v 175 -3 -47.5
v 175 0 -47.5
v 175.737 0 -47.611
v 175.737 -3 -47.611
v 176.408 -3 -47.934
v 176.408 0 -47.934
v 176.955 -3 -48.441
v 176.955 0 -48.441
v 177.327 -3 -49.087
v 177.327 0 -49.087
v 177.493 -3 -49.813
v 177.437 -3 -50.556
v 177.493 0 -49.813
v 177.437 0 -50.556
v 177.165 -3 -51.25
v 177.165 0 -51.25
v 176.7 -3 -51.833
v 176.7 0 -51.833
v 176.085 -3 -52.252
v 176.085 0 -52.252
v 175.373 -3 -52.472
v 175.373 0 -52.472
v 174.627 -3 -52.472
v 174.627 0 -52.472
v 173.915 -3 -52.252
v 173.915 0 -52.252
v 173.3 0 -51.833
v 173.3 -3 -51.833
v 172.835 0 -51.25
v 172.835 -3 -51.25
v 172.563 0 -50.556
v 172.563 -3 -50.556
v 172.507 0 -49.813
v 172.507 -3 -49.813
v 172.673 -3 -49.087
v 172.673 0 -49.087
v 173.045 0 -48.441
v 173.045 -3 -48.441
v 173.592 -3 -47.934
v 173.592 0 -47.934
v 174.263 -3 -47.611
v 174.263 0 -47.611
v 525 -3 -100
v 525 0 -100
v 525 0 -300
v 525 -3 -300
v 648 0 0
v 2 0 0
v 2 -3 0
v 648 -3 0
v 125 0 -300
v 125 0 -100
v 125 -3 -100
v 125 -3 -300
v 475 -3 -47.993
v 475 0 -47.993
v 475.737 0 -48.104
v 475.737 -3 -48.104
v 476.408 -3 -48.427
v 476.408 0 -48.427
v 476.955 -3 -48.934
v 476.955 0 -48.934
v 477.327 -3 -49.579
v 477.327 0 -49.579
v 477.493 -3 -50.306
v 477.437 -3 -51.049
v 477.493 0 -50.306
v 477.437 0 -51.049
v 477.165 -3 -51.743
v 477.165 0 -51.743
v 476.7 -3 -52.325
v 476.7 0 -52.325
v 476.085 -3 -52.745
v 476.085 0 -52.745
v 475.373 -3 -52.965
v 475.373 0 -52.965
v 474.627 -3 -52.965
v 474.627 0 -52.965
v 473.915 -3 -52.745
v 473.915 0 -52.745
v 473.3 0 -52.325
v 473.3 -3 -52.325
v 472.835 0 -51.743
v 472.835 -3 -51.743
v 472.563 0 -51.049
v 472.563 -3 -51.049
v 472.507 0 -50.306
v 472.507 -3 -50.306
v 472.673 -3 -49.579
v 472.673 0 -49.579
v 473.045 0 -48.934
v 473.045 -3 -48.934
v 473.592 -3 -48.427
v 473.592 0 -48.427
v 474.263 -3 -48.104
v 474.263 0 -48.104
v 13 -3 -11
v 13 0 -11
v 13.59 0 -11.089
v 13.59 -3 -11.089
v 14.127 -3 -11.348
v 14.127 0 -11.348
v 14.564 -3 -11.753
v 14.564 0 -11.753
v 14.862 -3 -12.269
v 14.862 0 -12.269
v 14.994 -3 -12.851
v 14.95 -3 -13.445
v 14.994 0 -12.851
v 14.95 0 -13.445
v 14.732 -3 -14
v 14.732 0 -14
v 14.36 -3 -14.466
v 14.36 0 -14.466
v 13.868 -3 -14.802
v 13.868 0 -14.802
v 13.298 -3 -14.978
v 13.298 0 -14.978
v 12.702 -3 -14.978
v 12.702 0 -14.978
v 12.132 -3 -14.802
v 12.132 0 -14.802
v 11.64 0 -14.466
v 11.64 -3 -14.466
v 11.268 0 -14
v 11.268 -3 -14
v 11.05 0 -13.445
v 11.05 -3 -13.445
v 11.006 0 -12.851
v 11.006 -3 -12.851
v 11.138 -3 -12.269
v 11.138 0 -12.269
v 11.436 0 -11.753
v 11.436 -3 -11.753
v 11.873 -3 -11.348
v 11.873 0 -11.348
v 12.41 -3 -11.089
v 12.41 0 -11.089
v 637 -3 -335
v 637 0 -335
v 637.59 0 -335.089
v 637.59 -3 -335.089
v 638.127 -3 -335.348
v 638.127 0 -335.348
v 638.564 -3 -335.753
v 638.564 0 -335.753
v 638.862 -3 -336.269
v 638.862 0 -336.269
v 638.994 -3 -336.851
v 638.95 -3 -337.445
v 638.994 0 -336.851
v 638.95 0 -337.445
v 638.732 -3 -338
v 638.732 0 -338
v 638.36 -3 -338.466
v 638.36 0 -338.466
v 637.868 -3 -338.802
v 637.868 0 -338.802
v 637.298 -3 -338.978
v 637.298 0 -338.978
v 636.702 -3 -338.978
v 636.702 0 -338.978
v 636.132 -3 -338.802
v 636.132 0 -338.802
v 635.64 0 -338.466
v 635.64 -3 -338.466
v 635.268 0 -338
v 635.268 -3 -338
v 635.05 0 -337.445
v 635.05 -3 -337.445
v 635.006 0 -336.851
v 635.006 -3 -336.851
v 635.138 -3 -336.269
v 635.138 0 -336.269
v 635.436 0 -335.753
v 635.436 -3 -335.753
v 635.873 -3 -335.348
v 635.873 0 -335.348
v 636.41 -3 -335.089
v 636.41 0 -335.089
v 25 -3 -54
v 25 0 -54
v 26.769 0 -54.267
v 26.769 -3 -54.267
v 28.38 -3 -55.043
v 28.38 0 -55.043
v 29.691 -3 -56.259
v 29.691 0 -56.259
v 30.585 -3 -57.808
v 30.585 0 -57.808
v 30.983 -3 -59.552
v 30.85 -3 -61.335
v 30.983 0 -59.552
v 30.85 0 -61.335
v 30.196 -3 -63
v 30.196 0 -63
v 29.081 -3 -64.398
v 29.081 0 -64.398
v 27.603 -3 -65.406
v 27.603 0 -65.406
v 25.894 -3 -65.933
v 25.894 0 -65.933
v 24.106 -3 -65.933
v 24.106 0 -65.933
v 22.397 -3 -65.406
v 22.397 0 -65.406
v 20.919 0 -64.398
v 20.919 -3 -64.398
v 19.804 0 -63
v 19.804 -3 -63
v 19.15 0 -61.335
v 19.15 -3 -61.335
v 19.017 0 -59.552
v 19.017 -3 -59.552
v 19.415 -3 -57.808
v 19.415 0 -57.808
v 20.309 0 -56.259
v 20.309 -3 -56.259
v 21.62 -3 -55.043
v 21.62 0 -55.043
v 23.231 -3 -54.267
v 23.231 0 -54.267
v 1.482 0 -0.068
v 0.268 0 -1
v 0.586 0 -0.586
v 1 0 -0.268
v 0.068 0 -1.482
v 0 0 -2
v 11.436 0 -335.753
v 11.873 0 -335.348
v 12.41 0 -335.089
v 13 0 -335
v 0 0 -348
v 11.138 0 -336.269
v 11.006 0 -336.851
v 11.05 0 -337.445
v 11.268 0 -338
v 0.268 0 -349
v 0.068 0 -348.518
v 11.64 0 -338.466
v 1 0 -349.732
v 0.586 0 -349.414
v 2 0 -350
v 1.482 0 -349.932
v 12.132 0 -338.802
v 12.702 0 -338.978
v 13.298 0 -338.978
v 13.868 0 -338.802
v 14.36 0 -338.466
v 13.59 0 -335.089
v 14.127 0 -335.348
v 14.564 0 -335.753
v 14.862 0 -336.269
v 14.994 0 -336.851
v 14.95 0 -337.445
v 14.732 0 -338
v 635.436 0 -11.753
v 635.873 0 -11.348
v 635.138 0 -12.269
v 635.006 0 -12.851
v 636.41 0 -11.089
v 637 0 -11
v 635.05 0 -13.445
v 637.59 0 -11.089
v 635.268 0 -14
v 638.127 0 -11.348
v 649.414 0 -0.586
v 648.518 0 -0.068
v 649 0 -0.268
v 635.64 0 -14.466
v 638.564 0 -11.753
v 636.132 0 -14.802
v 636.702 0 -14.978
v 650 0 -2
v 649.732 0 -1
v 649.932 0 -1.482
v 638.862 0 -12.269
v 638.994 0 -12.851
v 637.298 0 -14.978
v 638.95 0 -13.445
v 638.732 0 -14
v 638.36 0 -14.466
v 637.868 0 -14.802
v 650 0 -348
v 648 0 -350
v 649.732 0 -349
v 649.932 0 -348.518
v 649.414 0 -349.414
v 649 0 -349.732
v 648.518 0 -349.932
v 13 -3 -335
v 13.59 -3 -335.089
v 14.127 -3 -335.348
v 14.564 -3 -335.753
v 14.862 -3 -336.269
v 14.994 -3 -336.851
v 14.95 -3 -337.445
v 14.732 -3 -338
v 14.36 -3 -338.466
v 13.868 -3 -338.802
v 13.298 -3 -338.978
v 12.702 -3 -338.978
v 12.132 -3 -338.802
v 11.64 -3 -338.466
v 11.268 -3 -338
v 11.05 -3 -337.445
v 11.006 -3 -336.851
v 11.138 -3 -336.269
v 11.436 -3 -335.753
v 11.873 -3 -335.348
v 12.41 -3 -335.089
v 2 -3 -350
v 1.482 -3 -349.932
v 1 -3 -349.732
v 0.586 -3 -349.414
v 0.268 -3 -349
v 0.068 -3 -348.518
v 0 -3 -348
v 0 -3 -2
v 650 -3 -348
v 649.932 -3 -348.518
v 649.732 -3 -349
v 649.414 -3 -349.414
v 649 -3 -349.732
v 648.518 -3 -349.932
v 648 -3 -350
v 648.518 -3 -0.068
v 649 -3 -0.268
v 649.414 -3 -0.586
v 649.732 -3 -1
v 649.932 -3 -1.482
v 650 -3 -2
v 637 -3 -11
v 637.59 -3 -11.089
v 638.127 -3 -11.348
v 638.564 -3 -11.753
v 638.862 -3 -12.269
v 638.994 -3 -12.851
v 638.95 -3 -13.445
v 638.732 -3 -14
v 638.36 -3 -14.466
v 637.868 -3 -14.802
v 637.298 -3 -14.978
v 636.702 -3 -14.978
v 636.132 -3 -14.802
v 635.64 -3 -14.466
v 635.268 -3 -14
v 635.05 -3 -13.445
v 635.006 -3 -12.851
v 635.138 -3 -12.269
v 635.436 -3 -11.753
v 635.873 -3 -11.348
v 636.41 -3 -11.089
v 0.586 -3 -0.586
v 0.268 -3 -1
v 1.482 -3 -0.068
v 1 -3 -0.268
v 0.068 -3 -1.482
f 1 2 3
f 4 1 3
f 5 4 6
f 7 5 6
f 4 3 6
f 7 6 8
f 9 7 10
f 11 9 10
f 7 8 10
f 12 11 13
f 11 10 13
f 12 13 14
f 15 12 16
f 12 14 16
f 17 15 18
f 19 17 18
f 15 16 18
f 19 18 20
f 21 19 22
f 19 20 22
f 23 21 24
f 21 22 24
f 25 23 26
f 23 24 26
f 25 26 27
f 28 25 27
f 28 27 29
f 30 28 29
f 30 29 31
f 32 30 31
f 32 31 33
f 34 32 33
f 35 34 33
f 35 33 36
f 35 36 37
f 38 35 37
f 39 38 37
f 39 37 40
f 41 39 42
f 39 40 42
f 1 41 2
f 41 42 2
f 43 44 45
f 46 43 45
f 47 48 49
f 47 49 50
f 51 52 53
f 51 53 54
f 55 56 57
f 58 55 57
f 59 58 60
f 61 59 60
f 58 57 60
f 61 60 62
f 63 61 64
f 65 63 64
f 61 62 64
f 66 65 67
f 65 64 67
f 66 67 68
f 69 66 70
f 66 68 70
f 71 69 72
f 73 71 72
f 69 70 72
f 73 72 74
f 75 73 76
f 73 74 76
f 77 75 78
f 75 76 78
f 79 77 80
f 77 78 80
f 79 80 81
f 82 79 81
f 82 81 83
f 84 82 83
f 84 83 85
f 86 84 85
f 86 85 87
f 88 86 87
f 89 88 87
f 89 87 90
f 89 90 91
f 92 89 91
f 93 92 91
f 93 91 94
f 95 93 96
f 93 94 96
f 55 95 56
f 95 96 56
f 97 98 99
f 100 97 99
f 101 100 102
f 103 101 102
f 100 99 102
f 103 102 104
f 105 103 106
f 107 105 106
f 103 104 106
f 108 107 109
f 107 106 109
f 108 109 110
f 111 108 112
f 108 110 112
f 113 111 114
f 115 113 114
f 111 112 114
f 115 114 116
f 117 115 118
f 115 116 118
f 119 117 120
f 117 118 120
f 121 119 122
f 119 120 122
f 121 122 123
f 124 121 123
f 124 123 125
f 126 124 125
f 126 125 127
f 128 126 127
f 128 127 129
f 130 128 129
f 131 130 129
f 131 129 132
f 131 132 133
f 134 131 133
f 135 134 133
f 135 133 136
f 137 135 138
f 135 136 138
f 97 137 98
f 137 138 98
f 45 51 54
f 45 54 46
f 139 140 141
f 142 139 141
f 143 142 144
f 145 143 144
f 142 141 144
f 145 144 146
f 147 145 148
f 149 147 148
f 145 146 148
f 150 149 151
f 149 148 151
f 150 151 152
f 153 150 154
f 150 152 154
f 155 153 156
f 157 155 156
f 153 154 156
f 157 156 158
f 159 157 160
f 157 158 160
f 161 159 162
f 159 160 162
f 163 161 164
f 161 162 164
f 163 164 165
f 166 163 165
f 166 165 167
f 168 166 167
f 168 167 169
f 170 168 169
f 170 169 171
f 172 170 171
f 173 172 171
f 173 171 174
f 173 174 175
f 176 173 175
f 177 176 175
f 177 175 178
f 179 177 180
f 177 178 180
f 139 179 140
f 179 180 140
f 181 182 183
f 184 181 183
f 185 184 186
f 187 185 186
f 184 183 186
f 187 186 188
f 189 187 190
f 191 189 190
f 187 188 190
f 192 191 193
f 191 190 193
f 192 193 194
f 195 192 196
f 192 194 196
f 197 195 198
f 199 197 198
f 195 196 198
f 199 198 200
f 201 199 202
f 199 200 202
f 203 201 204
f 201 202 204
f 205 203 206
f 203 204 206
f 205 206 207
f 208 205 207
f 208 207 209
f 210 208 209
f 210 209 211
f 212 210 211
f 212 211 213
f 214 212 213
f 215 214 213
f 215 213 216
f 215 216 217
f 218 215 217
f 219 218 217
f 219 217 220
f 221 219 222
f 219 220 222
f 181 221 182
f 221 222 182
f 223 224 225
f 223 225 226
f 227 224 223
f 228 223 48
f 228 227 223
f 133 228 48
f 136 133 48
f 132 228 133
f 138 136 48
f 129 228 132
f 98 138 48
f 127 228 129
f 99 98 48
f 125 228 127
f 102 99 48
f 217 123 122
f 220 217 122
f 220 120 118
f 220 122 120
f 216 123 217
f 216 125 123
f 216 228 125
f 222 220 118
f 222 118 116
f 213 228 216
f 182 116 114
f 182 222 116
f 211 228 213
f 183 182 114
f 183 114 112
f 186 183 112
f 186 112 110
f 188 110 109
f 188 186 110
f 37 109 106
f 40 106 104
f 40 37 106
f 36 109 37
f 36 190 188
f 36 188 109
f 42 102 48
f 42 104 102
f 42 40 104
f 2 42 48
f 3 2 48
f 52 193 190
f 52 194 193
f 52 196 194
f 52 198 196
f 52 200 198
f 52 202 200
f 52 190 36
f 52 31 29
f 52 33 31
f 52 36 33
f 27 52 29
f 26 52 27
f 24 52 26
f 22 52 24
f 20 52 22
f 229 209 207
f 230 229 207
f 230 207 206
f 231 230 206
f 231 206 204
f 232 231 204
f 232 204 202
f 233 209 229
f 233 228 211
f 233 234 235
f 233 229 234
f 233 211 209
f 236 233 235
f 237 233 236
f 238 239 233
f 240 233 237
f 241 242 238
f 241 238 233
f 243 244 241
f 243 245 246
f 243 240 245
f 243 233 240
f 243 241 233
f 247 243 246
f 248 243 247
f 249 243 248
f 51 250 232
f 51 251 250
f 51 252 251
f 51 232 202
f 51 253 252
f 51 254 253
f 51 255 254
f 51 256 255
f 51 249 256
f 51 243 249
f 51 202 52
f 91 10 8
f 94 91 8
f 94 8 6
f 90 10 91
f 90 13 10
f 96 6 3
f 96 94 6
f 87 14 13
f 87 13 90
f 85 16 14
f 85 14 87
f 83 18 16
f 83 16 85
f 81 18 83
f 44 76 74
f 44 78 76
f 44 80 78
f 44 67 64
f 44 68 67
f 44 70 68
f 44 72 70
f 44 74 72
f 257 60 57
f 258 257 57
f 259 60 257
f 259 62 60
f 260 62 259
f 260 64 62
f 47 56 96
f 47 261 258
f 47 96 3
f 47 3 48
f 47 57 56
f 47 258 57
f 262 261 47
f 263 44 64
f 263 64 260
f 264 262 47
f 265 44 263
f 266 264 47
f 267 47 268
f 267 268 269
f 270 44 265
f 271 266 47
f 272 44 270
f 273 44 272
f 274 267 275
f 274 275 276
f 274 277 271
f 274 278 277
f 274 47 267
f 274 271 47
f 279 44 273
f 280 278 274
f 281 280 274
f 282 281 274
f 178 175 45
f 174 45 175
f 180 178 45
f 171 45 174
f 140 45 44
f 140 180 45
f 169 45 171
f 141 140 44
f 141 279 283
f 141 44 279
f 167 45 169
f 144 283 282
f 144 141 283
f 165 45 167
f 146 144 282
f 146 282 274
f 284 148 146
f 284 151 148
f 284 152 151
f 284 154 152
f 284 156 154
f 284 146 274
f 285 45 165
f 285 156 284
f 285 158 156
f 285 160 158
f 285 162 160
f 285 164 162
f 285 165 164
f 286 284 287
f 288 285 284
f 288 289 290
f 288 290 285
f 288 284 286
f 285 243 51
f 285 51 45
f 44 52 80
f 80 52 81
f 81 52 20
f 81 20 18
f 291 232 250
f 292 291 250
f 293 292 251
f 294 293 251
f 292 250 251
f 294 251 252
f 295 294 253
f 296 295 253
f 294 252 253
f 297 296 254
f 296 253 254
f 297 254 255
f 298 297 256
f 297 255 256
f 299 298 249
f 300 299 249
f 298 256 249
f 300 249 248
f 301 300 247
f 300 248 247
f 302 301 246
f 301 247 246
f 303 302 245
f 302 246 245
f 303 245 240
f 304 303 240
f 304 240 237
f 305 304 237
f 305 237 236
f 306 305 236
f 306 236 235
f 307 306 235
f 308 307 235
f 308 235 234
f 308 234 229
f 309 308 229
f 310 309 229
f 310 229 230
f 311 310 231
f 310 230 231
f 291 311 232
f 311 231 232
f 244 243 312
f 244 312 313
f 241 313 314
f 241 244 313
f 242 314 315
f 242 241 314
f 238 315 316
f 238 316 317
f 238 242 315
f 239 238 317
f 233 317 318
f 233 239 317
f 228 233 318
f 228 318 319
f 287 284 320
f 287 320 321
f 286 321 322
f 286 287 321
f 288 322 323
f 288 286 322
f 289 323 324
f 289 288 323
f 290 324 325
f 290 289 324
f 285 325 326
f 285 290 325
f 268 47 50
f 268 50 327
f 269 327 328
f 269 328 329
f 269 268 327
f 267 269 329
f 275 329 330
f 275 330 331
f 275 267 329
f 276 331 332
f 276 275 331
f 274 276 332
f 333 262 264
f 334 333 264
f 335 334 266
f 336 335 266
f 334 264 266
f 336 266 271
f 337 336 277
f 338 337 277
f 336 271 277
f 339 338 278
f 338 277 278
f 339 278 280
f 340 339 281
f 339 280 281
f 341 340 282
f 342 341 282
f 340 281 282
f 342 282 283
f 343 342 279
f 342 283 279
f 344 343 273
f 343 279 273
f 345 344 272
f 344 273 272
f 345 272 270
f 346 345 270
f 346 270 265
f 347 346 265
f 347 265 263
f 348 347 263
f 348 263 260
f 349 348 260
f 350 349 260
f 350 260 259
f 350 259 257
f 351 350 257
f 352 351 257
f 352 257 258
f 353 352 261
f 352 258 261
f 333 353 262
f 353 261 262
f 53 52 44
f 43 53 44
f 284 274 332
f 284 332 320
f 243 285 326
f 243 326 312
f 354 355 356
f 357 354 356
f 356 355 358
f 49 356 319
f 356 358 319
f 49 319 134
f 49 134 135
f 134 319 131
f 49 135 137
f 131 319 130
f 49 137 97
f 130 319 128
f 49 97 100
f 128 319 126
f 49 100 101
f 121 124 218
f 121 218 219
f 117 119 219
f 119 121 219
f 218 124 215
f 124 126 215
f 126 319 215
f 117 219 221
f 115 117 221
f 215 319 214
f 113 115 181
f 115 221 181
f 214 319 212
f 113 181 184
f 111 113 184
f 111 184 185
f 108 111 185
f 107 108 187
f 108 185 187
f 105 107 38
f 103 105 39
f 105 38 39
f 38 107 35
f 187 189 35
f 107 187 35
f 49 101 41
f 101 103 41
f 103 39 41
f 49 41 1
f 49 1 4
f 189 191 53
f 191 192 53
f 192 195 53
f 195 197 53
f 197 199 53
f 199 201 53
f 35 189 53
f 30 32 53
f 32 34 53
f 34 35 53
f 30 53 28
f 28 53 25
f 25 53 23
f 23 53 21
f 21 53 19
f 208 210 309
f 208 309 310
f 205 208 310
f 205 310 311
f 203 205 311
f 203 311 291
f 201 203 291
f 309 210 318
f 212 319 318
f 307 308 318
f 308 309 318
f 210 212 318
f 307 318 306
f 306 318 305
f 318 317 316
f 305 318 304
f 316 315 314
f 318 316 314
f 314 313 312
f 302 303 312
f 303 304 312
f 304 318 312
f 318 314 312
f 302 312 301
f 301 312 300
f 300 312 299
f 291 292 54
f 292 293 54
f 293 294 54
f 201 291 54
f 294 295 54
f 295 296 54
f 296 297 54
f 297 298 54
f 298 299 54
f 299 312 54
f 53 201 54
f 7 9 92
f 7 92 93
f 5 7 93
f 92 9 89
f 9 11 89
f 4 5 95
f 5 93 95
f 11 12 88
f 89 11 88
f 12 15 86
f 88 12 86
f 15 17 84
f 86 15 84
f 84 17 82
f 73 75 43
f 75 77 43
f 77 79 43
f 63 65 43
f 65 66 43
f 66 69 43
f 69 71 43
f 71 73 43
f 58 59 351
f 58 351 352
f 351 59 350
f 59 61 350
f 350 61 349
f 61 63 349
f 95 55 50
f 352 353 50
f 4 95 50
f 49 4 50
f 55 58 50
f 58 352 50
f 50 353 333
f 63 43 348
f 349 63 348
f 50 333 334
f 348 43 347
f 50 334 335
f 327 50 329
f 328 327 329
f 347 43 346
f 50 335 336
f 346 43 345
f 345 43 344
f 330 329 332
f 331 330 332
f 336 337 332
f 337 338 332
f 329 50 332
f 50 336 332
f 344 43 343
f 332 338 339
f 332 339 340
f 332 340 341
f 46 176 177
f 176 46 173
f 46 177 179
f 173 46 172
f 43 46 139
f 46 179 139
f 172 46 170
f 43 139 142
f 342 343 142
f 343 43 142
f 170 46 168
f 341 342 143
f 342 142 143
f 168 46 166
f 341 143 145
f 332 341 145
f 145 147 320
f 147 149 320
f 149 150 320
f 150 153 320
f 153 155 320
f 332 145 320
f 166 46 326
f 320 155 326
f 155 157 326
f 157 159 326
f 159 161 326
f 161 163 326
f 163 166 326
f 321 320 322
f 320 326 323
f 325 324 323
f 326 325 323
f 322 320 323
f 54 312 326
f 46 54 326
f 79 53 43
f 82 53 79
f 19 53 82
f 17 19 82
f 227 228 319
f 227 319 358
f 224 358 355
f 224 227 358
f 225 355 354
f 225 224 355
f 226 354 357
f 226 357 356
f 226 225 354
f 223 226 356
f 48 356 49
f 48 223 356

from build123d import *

# Parameters (mm, degrees)
SKETCH_1_R      = 2
SKETCH_1_R_2    = 2.5
SKETCH_1_R_3    = 6
SKETCH_1_W      = 400
SKETCH_1_H      = 200
EXTRUDE_1_DEPTH = 3


with BuildPart() as part:
    # 草图1 → 凸台-拉伸1 (new body)
    with BuildSketch(Plane(origin=(0, 0, 0), x_dir=(1, 0, 0), z_dir=(0, 1, 0))):
        with BuildLine():
            Line((2, 0), (648, 0))
            ThreePointArc((648, 0), (649.414213562, 0.585786438), (650, 2))
            Line((650, 2), (650, 348))
            ThreePointArc((650, 348), (649.414213562, 349.414213562), (648, 350))
            Line((648, 350), (2, 350))
            ThreePointArc((2, 350), (0.585786438, 349.414213562), (0, 348))
            Line((0, 348), (0, 2))
            ThreePointArc((0, 2), (0.585786438, 0.585786438), (2, 0))
        make_face()
        with Locations(Location((13, 13, 0), (0, 0, 270))):
            Circle(SKETCH_1_R, mode=Mode.SUBTRACT)
        with Locations(Location((637, 13, 0), (0, 0, 270))):
            Circle(SKETCH_1_R, mode=Mode.SUBTRACT)
        with Locations(Location((13, 337, 0), (0, 0, 270))):
            Circle(SKETCH_1_R, mode=Mode.SUBTRACT)
        with Locations(Location((637, 337, 0), (0, 0, 270))):
            Circle(SKETCH_1_R, mode=Mode.SUBTRACT)
        with Locations(Location((475, 50.49256144, 0), (0, 0, 270))):
            Circle(SKETCH_1_R_2, mode=Mode.SUBTRACT)
        with Locations(Location((175, 50, 0), (0, 0, 270))):
            Circle(SKETCH_1_R_2, mode=Mode.SUBTRACT)
        with Locations(Location((25, 60, 0), (0, 0, 270))):
            Circle(SKETCH_1_R_3, mode=Mode.SUBTRACT)
        with Locations((325, 200)):
            Rectangle(SKETCH_1_W, SKETCH_1_H, mode=Mode.SUBTRACT)
    extrude(amount=-EXTRUDE_1_DEPTH)


solid = part.part
